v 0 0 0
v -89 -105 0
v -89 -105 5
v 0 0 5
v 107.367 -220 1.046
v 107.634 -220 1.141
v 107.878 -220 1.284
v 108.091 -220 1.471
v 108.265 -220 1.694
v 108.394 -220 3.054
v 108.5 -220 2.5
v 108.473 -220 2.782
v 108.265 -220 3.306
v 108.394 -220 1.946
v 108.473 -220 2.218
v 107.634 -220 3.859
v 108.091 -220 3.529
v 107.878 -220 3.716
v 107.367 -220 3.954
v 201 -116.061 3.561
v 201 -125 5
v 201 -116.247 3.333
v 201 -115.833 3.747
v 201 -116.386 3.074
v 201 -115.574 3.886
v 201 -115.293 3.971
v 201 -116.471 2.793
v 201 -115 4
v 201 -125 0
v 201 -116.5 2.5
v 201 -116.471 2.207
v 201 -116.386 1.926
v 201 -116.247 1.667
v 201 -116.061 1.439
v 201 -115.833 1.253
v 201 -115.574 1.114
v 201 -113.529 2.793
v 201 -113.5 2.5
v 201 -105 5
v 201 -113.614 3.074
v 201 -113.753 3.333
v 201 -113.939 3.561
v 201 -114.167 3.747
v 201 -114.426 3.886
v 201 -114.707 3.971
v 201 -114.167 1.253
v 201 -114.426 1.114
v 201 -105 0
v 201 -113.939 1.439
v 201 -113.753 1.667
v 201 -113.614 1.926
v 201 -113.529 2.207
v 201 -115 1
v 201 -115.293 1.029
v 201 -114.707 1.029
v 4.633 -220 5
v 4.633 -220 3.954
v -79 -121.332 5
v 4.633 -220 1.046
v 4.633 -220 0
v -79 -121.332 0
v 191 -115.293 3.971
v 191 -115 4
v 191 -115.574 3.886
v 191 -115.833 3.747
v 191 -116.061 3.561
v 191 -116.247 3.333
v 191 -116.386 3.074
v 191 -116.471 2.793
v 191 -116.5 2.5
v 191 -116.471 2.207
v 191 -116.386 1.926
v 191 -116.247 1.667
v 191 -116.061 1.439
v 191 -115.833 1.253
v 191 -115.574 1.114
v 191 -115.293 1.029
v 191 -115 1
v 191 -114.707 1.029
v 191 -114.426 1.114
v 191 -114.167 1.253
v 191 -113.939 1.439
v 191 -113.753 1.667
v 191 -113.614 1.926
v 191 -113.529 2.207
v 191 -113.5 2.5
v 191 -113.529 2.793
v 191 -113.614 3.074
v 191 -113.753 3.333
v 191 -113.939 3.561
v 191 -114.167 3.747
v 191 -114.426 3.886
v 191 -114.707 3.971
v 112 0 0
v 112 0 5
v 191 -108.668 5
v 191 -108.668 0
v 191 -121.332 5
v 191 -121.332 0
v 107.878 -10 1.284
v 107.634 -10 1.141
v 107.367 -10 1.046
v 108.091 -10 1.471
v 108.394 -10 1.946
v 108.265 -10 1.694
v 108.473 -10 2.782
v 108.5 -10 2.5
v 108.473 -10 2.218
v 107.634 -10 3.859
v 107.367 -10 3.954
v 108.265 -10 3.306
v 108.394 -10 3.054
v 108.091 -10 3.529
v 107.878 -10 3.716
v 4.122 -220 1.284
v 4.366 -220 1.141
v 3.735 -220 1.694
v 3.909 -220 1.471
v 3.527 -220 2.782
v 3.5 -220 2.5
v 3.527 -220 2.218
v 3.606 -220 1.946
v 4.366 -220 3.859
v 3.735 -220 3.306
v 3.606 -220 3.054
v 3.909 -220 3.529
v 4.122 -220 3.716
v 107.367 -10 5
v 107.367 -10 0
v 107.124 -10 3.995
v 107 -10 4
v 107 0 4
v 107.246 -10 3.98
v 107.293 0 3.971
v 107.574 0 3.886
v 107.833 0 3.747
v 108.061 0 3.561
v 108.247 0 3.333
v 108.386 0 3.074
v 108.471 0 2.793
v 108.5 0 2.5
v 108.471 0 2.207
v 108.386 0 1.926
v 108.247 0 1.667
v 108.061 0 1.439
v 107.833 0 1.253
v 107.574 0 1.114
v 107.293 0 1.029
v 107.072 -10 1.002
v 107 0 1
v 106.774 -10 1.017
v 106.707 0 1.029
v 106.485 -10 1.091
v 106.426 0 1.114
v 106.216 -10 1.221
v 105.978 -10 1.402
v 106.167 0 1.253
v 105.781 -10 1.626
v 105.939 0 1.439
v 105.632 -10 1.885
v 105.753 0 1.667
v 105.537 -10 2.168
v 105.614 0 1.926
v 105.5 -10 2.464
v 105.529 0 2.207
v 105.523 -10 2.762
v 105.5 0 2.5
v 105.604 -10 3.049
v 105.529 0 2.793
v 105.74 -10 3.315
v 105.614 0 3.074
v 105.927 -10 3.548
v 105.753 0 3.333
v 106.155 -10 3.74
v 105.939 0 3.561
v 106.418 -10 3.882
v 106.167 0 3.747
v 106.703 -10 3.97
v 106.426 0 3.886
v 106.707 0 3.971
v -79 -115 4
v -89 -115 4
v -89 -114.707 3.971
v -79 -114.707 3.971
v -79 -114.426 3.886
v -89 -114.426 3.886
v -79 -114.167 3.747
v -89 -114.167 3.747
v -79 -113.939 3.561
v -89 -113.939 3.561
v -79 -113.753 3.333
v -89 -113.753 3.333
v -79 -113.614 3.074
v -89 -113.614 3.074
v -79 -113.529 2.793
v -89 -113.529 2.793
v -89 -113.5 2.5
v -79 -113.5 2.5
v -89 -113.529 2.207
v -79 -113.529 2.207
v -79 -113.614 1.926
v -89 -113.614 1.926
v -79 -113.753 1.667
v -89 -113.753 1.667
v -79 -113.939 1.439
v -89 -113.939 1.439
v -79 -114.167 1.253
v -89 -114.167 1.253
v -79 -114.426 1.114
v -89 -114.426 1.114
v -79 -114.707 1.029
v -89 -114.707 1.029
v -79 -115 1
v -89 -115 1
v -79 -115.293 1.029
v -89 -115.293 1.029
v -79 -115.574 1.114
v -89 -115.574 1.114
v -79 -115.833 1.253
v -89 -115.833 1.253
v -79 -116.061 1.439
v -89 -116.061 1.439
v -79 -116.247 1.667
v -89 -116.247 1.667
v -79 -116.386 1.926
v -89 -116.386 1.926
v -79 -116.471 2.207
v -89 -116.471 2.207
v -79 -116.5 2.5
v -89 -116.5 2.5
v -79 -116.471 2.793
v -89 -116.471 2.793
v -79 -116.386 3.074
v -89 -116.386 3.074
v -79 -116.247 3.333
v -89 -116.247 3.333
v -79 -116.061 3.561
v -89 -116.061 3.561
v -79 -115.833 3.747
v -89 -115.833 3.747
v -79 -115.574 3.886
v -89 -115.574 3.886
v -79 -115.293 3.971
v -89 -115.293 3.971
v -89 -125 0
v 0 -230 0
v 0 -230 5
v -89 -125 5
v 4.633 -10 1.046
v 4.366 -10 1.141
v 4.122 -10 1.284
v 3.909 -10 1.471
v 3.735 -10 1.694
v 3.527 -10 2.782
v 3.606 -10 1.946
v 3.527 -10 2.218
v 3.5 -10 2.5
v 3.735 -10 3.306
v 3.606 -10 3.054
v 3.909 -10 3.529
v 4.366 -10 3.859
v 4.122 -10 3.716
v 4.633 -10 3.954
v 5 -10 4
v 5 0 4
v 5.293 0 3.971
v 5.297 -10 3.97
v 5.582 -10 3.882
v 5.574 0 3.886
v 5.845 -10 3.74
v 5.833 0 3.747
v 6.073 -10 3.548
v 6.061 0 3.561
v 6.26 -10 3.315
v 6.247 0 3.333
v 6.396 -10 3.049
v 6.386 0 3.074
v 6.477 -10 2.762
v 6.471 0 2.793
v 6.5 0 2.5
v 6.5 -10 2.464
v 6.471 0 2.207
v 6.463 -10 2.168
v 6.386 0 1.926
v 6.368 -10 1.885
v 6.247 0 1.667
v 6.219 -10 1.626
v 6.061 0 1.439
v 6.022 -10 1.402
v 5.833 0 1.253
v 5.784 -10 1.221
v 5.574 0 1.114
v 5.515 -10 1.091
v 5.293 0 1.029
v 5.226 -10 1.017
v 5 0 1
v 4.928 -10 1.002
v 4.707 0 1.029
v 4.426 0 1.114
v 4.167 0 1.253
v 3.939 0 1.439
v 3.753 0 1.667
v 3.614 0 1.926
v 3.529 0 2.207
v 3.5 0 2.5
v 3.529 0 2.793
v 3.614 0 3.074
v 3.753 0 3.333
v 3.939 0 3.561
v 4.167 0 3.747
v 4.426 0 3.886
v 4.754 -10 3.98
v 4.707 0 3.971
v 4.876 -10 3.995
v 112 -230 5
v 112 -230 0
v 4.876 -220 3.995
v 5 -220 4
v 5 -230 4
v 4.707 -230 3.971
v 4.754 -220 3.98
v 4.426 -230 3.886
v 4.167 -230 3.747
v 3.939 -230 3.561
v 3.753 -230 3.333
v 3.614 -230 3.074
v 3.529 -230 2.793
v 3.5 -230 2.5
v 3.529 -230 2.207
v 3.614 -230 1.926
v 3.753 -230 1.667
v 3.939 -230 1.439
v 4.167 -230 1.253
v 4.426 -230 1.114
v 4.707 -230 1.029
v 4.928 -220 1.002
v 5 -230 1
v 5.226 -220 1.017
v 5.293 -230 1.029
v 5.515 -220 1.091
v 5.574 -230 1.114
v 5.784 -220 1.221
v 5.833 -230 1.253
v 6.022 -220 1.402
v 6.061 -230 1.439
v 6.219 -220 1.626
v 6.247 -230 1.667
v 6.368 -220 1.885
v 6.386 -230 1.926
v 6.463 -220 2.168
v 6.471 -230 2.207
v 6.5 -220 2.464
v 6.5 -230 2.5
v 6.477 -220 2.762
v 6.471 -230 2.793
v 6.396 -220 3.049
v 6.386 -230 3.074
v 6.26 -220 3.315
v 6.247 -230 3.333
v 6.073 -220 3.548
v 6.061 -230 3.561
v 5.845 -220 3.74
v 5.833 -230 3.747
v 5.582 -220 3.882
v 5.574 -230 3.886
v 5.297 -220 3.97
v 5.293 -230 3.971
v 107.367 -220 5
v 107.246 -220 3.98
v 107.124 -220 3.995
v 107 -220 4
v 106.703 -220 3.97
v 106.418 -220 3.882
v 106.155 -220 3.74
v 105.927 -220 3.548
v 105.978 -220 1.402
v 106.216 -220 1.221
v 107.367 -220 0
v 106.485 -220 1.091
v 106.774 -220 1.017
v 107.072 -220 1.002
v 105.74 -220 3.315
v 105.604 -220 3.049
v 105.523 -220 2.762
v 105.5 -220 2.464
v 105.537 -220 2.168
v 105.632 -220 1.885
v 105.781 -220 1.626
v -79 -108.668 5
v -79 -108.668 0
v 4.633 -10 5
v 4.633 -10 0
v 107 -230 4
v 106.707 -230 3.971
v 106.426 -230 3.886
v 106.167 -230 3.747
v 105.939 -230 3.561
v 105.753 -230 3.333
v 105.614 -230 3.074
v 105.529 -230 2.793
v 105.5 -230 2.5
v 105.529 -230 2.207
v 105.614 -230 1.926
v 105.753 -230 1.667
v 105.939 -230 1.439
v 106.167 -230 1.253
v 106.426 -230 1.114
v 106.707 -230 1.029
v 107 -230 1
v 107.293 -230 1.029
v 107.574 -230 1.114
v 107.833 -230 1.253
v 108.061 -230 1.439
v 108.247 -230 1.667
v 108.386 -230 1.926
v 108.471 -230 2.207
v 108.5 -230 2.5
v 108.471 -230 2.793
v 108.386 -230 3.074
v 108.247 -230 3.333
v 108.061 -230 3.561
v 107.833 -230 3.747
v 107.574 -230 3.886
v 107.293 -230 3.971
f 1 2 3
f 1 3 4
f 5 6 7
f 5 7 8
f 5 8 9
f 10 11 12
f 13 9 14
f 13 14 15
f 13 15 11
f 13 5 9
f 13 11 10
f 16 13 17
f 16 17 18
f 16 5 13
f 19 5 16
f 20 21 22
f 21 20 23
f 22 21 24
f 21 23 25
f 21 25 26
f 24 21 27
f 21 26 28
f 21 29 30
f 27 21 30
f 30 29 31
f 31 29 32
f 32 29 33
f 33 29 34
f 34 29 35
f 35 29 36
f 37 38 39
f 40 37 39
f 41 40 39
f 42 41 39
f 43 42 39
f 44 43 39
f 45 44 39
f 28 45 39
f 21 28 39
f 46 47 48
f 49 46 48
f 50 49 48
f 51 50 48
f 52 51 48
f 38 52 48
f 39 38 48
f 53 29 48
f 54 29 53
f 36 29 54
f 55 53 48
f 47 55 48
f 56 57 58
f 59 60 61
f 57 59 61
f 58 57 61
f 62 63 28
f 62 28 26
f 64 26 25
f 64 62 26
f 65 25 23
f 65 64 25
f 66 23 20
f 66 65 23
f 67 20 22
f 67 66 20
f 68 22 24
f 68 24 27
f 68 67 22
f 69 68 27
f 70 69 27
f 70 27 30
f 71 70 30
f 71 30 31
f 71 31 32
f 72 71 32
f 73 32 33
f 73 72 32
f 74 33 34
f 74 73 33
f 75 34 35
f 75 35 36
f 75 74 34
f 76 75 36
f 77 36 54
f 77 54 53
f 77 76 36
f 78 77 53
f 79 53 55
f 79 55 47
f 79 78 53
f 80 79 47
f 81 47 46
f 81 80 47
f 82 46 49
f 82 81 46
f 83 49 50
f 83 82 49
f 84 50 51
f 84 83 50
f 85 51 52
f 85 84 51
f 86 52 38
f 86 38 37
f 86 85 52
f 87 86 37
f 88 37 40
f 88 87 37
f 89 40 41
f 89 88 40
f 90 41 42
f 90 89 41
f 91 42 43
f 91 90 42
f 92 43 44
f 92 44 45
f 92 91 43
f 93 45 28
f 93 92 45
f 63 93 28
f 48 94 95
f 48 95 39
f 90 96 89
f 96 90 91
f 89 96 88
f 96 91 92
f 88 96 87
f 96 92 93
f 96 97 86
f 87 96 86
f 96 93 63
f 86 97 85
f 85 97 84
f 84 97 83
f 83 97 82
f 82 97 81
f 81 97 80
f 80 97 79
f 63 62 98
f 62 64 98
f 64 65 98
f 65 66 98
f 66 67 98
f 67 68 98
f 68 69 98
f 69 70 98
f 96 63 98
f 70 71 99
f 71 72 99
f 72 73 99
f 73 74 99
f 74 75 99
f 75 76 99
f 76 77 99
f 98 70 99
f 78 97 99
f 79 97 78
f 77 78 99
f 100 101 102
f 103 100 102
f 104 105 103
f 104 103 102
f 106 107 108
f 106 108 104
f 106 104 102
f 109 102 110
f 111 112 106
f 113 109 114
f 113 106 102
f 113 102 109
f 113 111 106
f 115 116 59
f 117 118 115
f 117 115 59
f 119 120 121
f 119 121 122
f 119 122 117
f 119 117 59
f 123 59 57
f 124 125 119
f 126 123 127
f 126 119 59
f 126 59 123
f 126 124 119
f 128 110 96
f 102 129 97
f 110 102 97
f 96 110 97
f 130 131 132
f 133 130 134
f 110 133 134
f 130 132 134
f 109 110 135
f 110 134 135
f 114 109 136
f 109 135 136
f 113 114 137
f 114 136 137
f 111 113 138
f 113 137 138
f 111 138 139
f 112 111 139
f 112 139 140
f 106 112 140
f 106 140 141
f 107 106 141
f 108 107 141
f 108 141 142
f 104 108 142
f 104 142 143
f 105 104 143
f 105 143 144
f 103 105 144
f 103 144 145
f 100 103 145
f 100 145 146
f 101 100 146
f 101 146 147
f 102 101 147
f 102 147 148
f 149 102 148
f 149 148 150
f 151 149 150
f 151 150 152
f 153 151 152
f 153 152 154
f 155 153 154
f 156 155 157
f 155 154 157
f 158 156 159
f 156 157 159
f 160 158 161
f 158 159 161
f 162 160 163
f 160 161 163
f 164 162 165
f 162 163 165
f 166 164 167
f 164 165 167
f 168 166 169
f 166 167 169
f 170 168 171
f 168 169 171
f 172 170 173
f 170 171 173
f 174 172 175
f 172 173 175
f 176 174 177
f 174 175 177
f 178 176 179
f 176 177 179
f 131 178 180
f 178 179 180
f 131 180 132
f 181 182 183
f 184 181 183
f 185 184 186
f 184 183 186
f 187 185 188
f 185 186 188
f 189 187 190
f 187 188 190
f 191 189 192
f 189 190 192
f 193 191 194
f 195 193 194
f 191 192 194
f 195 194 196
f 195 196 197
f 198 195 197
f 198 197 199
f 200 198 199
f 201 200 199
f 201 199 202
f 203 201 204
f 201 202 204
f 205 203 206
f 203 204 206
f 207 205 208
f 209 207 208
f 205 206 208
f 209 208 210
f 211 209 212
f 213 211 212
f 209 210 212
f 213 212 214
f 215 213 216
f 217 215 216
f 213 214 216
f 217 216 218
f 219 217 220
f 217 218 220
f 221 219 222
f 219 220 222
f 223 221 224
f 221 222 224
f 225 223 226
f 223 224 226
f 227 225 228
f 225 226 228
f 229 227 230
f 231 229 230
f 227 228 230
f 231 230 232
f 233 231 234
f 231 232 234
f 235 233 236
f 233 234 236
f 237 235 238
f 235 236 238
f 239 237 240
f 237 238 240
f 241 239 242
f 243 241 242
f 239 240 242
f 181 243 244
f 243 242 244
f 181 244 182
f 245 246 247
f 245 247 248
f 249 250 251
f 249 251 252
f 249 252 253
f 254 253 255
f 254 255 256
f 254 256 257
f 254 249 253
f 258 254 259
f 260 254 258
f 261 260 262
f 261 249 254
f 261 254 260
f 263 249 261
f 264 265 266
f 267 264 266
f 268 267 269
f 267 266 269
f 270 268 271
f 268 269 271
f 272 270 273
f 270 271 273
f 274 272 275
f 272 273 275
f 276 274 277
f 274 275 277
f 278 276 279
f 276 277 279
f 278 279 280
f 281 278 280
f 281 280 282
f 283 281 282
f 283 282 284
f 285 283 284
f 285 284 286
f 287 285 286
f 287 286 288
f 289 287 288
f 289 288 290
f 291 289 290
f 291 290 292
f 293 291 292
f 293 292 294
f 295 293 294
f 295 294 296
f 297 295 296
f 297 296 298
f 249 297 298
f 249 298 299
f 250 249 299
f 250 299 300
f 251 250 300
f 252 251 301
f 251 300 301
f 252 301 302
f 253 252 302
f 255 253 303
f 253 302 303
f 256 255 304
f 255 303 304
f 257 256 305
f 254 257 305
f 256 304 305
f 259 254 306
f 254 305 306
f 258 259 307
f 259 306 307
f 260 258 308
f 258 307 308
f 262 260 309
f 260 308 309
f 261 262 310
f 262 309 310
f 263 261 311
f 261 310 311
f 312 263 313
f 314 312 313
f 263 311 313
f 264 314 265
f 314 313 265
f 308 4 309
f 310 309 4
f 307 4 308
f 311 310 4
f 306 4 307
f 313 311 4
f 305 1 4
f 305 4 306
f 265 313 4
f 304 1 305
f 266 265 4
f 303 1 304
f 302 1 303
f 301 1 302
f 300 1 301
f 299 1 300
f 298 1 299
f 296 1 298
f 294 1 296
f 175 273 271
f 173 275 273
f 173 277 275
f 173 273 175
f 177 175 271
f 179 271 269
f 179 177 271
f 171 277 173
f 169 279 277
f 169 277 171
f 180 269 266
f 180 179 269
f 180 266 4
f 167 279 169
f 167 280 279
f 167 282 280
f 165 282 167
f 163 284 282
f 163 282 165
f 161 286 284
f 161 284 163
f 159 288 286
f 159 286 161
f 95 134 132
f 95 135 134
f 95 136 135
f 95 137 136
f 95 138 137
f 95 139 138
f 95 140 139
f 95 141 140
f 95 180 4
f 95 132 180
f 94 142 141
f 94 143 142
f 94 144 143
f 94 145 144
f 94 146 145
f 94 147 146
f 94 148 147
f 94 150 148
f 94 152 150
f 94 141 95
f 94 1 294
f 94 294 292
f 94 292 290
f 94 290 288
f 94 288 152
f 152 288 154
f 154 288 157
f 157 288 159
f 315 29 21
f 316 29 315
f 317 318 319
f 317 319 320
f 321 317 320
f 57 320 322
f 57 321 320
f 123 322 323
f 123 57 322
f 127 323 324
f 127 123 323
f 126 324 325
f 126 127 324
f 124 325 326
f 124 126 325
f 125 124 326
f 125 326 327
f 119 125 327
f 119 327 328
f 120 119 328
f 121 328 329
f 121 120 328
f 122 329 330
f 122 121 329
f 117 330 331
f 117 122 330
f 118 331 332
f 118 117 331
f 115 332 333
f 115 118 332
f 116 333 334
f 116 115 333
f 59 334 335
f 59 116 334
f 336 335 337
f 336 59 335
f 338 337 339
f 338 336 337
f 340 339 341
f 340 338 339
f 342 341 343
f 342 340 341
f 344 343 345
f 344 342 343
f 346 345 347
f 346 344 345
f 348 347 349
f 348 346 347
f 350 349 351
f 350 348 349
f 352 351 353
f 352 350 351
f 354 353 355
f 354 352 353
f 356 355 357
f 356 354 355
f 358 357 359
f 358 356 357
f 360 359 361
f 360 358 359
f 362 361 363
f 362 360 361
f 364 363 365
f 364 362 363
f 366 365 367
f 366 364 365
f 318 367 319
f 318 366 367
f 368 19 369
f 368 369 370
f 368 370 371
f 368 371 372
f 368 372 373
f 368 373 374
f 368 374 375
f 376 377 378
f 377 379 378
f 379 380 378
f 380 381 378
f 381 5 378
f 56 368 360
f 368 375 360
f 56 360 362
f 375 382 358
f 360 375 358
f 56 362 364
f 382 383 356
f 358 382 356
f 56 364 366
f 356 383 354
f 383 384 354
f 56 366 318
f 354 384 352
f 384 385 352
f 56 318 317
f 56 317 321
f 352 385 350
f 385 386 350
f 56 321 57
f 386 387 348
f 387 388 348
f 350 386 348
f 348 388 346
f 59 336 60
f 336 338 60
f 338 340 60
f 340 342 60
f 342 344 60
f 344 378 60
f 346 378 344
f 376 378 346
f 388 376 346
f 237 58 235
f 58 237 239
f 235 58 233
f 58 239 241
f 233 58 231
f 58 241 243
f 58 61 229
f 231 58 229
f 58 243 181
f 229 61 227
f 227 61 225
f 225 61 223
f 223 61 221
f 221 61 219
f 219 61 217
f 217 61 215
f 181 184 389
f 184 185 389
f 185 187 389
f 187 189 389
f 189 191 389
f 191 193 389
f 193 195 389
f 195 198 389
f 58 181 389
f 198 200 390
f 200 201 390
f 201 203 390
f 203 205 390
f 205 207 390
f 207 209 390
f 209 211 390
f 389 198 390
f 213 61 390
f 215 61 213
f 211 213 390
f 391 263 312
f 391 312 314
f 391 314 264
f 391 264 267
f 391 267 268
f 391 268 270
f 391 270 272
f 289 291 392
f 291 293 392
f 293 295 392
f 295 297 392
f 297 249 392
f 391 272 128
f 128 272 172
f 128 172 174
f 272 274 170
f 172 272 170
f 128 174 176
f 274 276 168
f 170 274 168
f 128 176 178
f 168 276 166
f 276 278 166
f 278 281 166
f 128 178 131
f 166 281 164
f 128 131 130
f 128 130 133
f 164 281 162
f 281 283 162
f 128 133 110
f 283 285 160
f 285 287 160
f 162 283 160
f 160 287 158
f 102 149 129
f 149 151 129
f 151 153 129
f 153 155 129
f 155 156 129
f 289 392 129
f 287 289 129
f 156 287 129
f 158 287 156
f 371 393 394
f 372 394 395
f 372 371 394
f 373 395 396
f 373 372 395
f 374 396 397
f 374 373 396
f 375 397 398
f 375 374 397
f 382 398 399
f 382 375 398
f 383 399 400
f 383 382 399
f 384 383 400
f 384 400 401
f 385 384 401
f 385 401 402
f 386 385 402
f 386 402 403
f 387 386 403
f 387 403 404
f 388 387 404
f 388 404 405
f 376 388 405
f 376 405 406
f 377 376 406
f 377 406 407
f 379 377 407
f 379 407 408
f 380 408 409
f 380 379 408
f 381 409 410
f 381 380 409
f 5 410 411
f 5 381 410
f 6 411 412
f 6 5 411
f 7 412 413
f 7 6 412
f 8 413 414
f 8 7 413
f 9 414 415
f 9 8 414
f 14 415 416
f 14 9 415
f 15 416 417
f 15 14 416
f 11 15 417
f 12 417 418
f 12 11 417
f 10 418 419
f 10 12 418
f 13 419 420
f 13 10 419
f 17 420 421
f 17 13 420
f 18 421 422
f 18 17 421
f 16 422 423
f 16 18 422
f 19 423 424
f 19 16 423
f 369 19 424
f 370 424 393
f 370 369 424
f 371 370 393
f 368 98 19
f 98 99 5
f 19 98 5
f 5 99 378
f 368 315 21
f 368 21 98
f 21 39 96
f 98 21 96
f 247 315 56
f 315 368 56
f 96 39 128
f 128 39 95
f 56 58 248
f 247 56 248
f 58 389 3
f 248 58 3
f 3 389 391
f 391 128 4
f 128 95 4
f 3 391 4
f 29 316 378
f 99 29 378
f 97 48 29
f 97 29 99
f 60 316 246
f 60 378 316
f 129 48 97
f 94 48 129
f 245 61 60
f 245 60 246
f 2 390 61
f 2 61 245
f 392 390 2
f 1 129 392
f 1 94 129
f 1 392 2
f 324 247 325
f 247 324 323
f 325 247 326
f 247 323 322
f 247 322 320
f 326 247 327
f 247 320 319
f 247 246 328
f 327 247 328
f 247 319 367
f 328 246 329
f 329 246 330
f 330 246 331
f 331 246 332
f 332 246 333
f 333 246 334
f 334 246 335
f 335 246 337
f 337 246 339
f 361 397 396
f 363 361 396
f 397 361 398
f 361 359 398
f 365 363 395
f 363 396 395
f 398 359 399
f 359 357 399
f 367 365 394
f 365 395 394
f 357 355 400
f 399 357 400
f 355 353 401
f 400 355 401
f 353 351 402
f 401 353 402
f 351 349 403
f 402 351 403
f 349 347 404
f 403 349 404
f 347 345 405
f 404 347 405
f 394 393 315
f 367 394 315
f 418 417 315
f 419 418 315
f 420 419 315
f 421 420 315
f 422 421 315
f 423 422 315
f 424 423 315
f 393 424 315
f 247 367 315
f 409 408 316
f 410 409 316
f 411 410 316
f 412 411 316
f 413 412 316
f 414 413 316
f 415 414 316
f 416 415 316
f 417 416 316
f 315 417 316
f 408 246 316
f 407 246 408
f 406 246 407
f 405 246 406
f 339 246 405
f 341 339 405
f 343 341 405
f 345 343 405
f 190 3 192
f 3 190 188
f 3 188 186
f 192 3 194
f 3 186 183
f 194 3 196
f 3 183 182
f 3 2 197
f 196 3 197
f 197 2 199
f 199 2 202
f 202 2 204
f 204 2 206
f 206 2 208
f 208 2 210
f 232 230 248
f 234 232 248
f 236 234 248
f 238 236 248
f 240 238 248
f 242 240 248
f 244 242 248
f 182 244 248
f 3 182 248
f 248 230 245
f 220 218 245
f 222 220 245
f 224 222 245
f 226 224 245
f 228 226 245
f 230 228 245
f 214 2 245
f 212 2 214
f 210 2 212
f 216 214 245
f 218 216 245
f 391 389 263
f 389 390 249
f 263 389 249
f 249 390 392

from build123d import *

# Parameters (mm, degrees)
EXTRUDE_1_DEPTH     = 5
SKETCH_2_R          = 1.5
CUT_EXTRUDE_1_DEPTH = 10
CUT_EXTRUDE_START   = -10
SKETCH_3_R          = 1.5
CUT_EXTRUDE_2_DEPTH = 10
SKETCH_4_R          = 1.5
CUT_EXTRUDE_3_DEPTH = 10
SKETCH_5_R          = 1.5
CUT_EXTRUDE_4_DEPTH = 10


with BuildPart() as part:
    # 草图1 → 凸台-拉伸1 (new body)
    with BuildSketch(Plane.XY):
        Polygon((0, 0), (112, 0), (201, -105), (201, -115), (201, -125), (112, -230), (56, -230), (0, -230), (-89, -125), (-89, -115), (-89, -105), align=None)
        Polygon((4.632806625, -10), (107.367193375, -10), (191, -108.667917928), (191, -115), (191, -121.332082072), (107.367193375, -220), (56, -220), (4.632806625, -220), (-79, -121.332082072), (-79, -115), (-79, -108.667917928), align=None, mode=Mode.SUBTRACT)
    extrude(amount=EXTRUDE_1_DEPTH)

    # 草图2 → 切除-拉伸1 (cut)
    with BuildSketch(Plane(origin=(0, 0, 0), x_dir=(1, 0, 0), z_dir=(0, 1, 0))):
        with Locations(Location((5, -2.5, 0), (0, 0, 270))):
            Circle(SKETCH_2_R)
        with Locations(Location((107, -2.5, 0), (0, 0, 270))):
            Circle(SKETCH_2_R)
    extrude(amount=-CUT_EXTRUDE_1_DEPTH, mode=Mode.SUBTRACT)

    # 草图3 → 切除-拉伸2 (cut)
    with BuildSketch(Plane.XZ.offset(230).offset(CUT_EXTRUDE_START)):
        with Locations(Location((5, 2.5, 0), (0, 0, 90))):
            Circle(SKETCH_3_R)
        with Locations(Location((107, 2.5, 0), (0, 0, 90))):
            Circle(SKETCH_3_R)
    extrude(amount=CUT_EXTRUDE_2_DEPTH, mode=Mode.SUBTRACT)

    # 草图4 → 切除-拉伸3 (cut)
    with BuildSketch(Plane.ZY.offset(89)):
        with Locations((2.5, -115)):
            Circle(SKETCH_4_R)
    extrude(amount=-CUT_EXTRUDE_3_DEPTH, mode=Mode.SUBTRACT)

    # 草图5 → 切除-拉伸4 (cut)
    with BuildSketch(Plane(origin=(201, 0, 0), x_dir=(0, 0, -1), z_dir=(1, 0, 0)).offset(CUT_EXTRUDE_START)):
        with Locations(Location((-2.5, -115, 0), (0, 0, 180))):
            Circle(SKETCH_5_R)
    extrude(amount=CUT_EXTRUDE_4_DEPTH, mode=Mode.SUBTRACT)


solid = part.part
